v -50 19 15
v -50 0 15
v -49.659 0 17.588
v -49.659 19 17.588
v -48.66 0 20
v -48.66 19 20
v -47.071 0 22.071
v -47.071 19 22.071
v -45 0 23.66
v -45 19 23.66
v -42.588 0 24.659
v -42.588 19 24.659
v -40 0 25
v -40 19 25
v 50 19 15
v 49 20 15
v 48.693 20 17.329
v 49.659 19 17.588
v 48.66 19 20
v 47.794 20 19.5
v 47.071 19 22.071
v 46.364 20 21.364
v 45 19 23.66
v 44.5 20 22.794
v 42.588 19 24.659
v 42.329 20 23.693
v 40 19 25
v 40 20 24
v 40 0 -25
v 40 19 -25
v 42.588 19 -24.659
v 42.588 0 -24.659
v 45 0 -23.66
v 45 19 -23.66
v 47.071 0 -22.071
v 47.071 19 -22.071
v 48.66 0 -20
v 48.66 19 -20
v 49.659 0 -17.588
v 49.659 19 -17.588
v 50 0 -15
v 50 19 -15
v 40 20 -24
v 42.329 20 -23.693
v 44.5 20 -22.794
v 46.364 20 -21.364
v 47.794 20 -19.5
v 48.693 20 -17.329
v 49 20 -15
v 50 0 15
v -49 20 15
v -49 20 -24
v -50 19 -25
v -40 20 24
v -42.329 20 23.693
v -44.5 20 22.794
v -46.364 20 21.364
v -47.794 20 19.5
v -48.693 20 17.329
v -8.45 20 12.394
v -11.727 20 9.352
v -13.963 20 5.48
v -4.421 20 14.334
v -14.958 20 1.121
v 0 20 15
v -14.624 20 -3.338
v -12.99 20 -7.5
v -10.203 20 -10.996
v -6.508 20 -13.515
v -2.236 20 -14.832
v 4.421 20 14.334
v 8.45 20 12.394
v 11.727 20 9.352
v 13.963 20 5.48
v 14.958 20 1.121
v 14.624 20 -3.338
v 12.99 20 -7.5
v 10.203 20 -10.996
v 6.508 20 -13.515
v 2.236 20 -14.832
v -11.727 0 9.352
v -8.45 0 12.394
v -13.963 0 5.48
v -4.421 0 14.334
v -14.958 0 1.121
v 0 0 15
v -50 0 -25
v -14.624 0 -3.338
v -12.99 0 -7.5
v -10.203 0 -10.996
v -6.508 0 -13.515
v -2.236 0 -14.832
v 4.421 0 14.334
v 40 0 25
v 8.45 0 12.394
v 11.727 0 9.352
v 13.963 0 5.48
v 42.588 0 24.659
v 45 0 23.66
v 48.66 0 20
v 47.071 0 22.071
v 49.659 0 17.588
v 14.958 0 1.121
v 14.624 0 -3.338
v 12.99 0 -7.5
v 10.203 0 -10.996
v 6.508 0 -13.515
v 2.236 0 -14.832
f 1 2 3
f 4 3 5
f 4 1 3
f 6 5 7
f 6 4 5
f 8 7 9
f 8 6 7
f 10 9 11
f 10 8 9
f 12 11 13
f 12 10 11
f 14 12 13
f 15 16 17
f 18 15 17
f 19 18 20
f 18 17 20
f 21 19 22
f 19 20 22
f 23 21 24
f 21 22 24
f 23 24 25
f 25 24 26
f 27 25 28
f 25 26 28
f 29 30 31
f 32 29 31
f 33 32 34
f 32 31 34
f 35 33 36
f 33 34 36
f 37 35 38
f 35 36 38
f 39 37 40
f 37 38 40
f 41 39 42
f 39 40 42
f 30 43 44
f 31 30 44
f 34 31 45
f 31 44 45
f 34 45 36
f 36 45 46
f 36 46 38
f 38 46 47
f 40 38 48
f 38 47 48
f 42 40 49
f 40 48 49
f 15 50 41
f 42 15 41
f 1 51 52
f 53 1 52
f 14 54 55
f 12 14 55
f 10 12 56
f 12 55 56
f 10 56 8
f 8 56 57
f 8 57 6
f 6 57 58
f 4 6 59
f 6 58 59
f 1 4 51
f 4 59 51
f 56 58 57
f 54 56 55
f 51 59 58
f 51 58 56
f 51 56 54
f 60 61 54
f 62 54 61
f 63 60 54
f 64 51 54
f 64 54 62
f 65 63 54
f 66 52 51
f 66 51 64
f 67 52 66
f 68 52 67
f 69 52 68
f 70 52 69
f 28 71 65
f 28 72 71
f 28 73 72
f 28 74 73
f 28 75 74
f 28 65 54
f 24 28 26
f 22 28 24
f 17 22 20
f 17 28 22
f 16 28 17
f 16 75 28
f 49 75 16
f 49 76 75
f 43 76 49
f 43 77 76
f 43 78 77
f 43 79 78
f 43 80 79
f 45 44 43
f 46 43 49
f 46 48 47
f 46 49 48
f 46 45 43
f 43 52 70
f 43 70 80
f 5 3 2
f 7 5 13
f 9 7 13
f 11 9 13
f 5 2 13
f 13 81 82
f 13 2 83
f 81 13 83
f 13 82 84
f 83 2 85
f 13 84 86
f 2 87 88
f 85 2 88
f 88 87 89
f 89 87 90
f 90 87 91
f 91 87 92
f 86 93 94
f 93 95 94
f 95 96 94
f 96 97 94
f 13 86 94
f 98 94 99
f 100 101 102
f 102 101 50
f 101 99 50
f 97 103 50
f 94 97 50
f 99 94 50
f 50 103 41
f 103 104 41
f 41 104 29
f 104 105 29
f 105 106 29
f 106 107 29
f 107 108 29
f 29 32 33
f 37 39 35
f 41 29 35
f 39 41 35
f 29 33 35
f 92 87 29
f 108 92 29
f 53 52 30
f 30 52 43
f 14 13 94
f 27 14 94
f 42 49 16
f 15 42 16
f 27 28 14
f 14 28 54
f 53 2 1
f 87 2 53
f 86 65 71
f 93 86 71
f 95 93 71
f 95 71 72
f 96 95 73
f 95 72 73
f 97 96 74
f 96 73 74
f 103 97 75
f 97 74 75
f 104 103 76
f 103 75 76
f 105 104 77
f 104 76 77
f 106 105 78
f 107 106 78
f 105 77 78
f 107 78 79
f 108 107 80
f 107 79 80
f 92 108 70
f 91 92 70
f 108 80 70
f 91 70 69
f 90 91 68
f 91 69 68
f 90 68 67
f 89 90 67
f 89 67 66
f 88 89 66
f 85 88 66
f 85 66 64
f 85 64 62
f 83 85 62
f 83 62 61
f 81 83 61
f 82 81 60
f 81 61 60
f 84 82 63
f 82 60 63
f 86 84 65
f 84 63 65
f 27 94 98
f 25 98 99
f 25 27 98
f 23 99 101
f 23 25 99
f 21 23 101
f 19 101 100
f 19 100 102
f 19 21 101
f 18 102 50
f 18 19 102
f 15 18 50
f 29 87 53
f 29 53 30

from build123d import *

# Parameters (mm, degrees)
SKETCH1_W           = 100
SKETCH1_H           = 50
BOSS_EXTRUDE1_DEPTH = 20
SKETCH2_R           = 15
CUT_EXTRUDE1_DEPTH  = 20
FILLET1_R           = 10
CHAMFER1_SIZE       = 1


with BuildPart() as part:
    # Sketch1 → Boss-Extrude1 (new body)
    with BuildSketch(Plane(origin=(0, 0, 0), x_dir=(1, 0, 0), z_dir=(0, 1, 0))):
        Rectangle(SKETCH1_W, SKETCH1_H)
    extrude(amount=BOSS_EXTRUDE1_DEPTH)

    # Sketch2 → Cut-Extrude1 (cut)
    with BuildSketch(Plane(origin=(0, 20, 0), x_dir=(1, 0, 0), z_dir=(0, 1, 0))):
        with Locations(Location((0, 0, 0), (0, 0, 270))):
            Circle(SKETCH2_R)
    extrude(amount=-CUT_EXTRUDE1_DEPTH, mode=Mode.SUBTRACT)

    # Fillet1
    fillet1_edges = [part.edges().sort_by_distance(p)[0] for p in [
        (50, 10, 25),
        (-50, 10, 25),
        (50, 10, -25),
    ]]
    fillet(fillet1_edges, radius=FILLET1_R)

    # Chamfer1
    chamfer1_edges = [part.edges().sort_by_distance(p)[0] for p in [
        (-50, 20, -5),
        (-5, 20, -25),
        (50, 20, 0),
        (0, 20, 25),
        (-47.071067812, 20, 22.071067812),
        (47.071067812, 20, 22.071067812),
        (47.071067812, 20, -22.071067812),
    ]]
    chamfer(chamfer1_edges, length=CHAMFER1_SIZE)


solid = part.part
